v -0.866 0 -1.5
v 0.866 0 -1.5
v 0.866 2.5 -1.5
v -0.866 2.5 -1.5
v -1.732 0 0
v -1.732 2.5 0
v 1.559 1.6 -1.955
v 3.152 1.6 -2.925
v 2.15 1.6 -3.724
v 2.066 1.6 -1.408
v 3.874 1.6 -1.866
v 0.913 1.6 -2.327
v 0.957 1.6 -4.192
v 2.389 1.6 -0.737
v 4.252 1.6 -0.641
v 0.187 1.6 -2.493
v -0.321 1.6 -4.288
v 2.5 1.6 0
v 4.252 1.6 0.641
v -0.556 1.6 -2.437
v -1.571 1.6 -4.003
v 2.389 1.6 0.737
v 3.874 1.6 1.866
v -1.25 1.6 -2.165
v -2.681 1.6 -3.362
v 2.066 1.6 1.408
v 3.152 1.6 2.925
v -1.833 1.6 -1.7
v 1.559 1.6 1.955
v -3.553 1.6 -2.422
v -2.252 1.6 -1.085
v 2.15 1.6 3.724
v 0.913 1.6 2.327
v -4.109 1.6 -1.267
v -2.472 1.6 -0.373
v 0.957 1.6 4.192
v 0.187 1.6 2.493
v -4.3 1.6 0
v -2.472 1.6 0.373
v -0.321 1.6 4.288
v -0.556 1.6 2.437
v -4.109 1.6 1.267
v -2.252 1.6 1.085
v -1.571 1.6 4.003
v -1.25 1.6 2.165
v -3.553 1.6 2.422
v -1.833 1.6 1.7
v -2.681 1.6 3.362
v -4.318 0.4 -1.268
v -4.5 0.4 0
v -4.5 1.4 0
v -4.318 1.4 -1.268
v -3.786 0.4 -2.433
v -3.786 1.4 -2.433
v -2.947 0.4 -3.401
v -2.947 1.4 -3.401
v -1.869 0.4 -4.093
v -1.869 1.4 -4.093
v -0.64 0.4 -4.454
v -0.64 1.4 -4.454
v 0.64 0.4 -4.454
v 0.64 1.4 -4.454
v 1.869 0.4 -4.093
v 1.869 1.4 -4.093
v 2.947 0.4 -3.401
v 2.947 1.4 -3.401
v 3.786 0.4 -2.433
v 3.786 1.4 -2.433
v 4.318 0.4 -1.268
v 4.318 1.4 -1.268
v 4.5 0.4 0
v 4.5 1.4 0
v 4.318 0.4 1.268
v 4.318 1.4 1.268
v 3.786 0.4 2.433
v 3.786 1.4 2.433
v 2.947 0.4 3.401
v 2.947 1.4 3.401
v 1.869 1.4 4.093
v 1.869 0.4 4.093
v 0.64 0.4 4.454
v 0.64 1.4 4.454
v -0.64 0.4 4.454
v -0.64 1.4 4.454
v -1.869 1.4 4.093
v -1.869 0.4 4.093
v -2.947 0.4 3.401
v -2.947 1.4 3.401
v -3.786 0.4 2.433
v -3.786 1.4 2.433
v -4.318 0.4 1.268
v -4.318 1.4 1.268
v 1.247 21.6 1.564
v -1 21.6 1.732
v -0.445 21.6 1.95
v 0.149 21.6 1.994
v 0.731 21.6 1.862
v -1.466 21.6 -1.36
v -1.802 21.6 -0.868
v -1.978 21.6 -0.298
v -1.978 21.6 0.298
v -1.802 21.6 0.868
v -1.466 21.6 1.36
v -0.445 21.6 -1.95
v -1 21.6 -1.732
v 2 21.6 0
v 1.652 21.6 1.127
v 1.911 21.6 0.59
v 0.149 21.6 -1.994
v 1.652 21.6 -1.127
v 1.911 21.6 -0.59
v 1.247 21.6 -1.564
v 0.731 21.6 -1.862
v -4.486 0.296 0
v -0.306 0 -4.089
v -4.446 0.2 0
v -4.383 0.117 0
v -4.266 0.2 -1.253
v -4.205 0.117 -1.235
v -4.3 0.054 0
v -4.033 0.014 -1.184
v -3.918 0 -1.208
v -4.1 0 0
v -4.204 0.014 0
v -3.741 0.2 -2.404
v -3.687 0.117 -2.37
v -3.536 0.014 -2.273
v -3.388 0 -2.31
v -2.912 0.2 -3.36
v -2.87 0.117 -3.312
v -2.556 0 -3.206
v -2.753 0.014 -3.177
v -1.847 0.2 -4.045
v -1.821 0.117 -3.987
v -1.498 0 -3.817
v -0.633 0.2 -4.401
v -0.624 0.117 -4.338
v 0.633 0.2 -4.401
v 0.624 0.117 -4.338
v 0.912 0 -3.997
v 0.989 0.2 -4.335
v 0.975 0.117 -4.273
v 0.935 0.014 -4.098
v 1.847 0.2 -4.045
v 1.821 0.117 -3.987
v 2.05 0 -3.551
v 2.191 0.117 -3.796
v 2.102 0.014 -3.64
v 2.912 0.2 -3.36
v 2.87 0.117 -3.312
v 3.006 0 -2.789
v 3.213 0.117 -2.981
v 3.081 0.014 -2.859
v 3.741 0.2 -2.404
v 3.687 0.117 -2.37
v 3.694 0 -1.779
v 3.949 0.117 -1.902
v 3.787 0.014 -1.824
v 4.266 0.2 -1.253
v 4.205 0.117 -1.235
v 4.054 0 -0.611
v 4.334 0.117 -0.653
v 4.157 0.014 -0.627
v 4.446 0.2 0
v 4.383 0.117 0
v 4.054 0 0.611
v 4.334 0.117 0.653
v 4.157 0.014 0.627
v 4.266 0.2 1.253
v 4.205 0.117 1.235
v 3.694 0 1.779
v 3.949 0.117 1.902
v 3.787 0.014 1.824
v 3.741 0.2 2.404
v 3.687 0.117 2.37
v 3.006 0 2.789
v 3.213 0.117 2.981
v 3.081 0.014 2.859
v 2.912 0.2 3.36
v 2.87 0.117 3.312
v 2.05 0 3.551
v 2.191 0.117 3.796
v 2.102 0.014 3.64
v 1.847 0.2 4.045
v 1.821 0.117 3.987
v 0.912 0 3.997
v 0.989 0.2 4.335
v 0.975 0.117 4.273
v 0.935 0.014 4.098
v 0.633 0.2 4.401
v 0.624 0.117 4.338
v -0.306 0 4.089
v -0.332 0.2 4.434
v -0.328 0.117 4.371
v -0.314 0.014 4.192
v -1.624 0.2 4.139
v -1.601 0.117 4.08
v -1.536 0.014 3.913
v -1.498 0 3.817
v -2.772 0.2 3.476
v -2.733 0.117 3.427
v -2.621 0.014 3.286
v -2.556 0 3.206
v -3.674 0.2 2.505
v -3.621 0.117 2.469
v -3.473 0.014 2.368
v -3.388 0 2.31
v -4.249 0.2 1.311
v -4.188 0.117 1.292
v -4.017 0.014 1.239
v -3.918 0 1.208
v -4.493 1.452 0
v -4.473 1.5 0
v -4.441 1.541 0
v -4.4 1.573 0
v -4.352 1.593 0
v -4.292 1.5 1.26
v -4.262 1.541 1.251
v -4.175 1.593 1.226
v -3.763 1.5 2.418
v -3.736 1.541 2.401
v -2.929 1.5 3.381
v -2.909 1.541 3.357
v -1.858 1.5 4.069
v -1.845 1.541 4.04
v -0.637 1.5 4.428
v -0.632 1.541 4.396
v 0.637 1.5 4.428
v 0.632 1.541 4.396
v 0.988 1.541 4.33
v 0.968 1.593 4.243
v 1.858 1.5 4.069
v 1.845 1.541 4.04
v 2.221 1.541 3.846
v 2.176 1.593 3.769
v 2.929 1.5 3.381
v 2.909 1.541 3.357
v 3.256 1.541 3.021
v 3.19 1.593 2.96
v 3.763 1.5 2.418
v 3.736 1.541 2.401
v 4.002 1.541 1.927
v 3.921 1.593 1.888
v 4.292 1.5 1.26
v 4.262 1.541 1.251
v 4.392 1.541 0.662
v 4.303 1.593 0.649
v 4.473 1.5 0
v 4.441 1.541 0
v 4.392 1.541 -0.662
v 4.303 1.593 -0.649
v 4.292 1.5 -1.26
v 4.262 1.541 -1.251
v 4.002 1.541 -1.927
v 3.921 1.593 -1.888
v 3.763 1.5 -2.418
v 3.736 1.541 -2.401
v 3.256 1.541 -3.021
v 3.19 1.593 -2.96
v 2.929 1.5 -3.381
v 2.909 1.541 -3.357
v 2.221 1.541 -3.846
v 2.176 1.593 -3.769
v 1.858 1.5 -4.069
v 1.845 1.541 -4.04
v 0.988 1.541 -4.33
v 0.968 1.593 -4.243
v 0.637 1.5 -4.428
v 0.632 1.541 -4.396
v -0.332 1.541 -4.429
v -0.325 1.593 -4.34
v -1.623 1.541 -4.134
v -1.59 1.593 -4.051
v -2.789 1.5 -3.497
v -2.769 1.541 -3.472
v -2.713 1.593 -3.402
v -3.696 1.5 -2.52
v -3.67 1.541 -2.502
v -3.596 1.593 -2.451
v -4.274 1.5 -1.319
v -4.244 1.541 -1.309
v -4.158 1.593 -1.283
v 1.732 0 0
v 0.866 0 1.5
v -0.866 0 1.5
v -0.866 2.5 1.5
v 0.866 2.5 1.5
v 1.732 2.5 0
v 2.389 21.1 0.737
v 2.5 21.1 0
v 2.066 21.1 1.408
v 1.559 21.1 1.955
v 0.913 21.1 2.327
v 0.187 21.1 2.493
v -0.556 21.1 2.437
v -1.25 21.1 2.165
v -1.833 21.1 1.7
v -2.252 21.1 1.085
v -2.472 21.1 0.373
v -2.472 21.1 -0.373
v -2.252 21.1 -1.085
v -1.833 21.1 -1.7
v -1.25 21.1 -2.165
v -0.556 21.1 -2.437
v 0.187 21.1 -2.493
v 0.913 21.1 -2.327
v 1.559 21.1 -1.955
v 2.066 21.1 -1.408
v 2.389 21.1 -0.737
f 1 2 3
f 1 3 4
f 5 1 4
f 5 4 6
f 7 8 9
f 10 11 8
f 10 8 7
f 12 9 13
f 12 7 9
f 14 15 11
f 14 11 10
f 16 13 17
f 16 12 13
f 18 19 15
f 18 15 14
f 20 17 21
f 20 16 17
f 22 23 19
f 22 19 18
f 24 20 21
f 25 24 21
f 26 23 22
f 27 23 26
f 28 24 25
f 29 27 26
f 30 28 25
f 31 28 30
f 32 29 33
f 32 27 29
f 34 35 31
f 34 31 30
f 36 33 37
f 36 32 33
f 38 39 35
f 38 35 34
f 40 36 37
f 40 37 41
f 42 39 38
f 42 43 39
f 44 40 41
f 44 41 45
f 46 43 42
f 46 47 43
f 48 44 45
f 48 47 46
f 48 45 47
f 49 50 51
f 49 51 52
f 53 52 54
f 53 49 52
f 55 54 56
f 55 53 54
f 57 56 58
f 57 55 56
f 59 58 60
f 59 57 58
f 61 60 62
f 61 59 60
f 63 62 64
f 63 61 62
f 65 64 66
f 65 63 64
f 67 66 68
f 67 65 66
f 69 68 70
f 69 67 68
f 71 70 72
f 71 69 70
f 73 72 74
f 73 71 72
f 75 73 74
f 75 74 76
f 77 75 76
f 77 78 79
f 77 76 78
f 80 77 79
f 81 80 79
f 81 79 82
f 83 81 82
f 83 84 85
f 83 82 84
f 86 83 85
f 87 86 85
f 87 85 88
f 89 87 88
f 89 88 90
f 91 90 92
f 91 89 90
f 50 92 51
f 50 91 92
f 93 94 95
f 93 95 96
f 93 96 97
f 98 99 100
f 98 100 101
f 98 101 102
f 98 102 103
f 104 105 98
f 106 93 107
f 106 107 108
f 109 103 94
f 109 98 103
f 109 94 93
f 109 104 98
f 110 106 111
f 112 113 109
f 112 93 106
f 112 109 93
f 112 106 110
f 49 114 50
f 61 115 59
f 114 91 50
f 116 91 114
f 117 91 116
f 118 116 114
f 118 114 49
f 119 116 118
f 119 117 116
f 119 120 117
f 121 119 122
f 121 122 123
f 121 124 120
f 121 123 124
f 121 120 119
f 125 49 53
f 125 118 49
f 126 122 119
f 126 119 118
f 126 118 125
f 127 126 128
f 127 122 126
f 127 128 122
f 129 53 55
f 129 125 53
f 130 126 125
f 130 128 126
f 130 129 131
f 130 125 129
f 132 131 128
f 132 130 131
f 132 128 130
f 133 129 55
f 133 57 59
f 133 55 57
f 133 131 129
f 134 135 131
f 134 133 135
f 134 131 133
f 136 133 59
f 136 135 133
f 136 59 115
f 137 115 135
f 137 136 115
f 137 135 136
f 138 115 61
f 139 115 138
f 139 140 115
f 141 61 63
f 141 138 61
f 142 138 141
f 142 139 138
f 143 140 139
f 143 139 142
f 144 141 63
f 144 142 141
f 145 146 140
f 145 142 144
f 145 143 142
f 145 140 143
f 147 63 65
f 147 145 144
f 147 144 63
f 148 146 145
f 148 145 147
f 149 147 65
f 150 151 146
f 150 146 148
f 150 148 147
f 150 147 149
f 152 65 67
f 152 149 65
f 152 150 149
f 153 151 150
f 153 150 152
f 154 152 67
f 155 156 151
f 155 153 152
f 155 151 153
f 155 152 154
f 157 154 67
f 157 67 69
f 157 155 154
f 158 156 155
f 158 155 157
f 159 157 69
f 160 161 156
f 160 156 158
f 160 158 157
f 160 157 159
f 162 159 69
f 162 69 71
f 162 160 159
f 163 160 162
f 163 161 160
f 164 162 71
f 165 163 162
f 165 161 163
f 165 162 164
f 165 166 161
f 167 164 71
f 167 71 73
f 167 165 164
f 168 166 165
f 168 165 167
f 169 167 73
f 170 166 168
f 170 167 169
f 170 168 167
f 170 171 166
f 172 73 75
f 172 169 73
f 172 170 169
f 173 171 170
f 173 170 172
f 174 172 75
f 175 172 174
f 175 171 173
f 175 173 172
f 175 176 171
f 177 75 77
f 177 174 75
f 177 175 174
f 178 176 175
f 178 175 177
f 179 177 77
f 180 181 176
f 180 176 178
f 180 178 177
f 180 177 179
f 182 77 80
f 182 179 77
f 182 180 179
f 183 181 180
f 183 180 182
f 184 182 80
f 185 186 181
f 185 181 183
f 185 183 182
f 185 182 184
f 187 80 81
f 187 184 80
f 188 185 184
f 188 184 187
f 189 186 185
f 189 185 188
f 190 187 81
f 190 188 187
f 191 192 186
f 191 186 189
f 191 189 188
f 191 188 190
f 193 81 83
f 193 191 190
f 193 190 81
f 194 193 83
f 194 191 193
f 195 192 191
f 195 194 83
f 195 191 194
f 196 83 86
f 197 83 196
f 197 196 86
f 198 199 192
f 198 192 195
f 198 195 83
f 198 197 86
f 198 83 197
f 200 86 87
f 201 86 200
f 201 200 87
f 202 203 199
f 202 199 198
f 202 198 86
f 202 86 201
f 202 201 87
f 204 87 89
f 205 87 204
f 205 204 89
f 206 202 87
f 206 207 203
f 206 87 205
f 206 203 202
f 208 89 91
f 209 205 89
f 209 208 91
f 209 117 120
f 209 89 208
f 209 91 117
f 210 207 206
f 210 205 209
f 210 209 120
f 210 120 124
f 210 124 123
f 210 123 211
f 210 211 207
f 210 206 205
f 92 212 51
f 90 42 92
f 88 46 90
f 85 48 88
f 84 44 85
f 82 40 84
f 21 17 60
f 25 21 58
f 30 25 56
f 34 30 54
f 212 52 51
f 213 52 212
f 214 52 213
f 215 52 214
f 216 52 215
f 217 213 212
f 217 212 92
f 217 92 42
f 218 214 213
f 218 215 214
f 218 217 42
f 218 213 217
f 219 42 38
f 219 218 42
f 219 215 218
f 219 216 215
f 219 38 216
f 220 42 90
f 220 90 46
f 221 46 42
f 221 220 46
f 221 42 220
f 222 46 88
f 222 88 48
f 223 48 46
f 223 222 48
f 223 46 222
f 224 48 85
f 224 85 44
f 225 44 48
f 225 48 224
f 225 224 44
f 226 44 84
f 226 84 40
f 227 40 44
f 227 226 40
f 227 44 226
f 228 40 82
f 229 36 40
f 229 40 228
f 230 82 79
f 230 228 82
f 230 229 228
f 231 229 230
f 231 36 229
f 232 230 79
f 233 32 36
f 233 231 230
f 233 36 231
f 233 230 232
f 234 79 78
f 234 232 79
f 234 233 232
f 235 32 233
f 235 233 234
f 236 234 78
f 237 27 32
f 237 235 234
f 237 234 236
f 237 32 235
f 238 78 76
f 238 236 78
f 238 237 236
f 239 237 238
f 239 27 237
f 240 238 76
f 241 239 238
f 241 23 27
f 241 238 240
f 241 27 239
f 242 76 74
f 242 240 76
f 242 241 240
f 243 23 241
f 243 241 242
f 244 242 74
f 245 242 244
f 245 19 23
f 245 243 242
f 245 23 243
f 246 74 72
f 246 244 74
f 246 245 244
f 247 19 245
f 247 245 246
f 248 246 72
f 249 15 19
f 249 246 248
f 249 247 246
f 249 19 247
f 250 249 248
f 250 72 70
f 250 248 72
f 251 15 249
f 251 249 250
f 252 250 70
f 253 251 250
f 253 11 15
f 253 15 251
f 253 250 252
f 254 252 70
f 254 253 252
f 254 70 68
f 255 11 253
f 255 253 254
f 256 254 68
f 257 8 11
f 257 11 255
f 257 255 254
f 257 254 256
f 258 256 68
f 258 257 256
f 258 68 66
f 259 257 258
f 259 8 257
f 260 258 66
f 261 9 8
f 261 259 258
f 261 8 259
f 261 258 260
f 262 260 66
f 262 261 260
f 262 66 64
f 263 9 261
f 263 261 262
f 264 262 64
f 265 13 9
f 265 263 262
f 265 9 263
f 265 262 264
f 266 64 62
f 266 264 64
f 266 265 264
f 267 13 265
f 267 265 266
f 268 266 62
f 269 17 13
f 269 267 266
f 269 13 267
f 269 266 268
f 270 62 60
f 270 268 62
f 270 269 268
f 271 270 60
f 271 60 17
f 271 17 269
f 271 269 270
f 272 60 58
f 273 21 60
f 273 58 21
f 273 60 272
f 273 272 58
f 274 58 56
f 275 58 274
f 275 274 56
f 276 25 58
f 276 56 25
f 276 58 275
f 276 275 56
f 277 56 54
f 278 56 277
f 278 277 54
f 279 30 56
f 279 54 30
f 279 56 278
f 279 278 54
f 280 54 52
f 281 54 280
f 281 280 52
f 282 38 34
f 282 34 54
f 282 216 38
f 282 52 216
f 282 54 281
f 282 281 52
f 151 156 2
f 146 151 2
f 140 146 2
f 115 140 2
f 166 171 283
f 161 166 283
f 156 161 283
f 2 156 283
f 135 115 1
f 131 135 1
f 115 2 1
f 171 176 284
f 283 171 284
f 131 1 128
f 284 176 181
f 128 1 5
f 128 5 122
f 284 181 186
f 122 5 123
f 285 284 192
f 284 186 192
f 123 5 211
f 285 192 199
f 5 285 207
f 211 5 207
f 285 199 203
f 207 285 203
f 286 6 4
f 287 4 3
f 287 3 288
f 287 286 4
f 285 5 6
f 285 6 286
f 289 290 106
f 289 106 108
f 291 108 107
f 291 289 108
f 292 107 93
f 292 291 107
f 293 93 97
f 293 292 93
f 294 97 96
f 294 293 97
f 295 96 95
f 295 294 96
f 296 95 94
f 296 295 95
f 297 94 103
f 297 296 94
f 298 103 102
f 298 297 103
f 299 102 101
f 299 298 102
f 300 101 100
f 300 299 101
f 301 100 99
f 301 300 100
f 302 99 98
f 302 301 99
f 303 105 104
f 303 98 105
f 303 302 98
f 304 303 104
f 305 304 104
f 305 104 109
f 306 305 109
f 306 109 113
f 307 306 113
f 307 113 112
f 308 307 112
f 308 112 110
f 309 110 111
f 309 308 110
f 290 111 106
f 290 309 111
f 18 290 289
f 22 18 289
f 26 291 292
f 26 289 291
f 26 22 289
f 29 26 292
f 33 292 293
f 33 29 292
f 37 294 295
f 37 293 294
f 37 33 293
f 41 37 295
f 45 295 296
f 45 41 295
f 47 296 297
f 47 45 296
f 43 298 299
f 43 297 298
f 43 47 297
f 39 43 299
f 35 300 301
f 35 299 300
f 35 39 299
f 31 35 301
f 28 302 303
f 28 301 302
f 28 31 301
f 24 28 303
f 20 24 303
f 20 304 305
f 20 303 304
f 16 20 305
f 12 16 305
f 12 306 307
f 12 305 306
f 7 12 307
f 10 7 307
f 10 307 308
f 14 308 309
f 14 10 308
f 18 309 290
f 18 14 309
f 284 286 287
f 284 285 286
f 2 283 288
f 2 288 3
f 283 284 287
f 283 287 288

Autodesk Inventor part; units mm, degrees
ref_plane "YZ Plane" through (0, 0, 0) normal (1, 0, 0) x (0, 1, 0)
ref_plane "XZ Plane" through (0, 0, 0) normal (0, 1, 0) x (-1, 0, 0)
ref_plane "XY Plane" through (0, 0, 0) normal (0, 0, 1) x (1, 0, 0)
sketch "Boceto1" plane through (0, 0, 0) normal (0, 1, 0) x (-1, 0, 0)
  circle A0 centre (0, 0) radius 4.5
  dimension "d0" = 9
extrude "Extrusión1" add sketch "Boceto1" along normal blind 1.6
sketch "Boceto2" plane through (0, 1.6, 0) normal (0, 1, 0) x (1, 0, 0)
  circle A0 centre (0, 0) radius 2.5
  dimension "d3" = 5
extrude "Extrusión2" add sketch "Boceto2" along normal blind 20
fillet "Empalme1" radius 0.4 1 edges at (4.5, 0, 0)
fillet "Empalme2" radius 0.2 1 edges at (4.5, 1.6, 0)
sketch "Boceto3" plane through (0, 0, 0) normal (0, -1, 0) x (1, 0, 0)
  line L0 (-1.7321, 0) -> (-0.866, 1.5)
  line L1 (-0.866, 1.5) -> (0.866, 1.5)
  line L2 (0.866, 1.5) -> (1.7321, 0)
  line L3 (1.7321, 0) -> (0.866, -1.5)
  line L4 (0.866, -1.5) -> (-0.866, -1.5)
  line L5 (-0.866, -1.5) -> (-1.7321, 0)
  point P0 (0, 0)
  point P1 (0, 0)
  dimension "d8" = 3
extrude "Extrusión3" cut sketch "Boceto3" against normal blind 2.5
chamfer "Chaflán1" distance 0.5 angle 45 1 edges at (-2.5, 21.6, 0)
thread "Rosca2" size "M5x0.8" class "6g" standard "ANSI Metric M Profile" length 18 offset 2
properties part number "Perno M5x8 cabeza plana" material "Hierro, gris"
